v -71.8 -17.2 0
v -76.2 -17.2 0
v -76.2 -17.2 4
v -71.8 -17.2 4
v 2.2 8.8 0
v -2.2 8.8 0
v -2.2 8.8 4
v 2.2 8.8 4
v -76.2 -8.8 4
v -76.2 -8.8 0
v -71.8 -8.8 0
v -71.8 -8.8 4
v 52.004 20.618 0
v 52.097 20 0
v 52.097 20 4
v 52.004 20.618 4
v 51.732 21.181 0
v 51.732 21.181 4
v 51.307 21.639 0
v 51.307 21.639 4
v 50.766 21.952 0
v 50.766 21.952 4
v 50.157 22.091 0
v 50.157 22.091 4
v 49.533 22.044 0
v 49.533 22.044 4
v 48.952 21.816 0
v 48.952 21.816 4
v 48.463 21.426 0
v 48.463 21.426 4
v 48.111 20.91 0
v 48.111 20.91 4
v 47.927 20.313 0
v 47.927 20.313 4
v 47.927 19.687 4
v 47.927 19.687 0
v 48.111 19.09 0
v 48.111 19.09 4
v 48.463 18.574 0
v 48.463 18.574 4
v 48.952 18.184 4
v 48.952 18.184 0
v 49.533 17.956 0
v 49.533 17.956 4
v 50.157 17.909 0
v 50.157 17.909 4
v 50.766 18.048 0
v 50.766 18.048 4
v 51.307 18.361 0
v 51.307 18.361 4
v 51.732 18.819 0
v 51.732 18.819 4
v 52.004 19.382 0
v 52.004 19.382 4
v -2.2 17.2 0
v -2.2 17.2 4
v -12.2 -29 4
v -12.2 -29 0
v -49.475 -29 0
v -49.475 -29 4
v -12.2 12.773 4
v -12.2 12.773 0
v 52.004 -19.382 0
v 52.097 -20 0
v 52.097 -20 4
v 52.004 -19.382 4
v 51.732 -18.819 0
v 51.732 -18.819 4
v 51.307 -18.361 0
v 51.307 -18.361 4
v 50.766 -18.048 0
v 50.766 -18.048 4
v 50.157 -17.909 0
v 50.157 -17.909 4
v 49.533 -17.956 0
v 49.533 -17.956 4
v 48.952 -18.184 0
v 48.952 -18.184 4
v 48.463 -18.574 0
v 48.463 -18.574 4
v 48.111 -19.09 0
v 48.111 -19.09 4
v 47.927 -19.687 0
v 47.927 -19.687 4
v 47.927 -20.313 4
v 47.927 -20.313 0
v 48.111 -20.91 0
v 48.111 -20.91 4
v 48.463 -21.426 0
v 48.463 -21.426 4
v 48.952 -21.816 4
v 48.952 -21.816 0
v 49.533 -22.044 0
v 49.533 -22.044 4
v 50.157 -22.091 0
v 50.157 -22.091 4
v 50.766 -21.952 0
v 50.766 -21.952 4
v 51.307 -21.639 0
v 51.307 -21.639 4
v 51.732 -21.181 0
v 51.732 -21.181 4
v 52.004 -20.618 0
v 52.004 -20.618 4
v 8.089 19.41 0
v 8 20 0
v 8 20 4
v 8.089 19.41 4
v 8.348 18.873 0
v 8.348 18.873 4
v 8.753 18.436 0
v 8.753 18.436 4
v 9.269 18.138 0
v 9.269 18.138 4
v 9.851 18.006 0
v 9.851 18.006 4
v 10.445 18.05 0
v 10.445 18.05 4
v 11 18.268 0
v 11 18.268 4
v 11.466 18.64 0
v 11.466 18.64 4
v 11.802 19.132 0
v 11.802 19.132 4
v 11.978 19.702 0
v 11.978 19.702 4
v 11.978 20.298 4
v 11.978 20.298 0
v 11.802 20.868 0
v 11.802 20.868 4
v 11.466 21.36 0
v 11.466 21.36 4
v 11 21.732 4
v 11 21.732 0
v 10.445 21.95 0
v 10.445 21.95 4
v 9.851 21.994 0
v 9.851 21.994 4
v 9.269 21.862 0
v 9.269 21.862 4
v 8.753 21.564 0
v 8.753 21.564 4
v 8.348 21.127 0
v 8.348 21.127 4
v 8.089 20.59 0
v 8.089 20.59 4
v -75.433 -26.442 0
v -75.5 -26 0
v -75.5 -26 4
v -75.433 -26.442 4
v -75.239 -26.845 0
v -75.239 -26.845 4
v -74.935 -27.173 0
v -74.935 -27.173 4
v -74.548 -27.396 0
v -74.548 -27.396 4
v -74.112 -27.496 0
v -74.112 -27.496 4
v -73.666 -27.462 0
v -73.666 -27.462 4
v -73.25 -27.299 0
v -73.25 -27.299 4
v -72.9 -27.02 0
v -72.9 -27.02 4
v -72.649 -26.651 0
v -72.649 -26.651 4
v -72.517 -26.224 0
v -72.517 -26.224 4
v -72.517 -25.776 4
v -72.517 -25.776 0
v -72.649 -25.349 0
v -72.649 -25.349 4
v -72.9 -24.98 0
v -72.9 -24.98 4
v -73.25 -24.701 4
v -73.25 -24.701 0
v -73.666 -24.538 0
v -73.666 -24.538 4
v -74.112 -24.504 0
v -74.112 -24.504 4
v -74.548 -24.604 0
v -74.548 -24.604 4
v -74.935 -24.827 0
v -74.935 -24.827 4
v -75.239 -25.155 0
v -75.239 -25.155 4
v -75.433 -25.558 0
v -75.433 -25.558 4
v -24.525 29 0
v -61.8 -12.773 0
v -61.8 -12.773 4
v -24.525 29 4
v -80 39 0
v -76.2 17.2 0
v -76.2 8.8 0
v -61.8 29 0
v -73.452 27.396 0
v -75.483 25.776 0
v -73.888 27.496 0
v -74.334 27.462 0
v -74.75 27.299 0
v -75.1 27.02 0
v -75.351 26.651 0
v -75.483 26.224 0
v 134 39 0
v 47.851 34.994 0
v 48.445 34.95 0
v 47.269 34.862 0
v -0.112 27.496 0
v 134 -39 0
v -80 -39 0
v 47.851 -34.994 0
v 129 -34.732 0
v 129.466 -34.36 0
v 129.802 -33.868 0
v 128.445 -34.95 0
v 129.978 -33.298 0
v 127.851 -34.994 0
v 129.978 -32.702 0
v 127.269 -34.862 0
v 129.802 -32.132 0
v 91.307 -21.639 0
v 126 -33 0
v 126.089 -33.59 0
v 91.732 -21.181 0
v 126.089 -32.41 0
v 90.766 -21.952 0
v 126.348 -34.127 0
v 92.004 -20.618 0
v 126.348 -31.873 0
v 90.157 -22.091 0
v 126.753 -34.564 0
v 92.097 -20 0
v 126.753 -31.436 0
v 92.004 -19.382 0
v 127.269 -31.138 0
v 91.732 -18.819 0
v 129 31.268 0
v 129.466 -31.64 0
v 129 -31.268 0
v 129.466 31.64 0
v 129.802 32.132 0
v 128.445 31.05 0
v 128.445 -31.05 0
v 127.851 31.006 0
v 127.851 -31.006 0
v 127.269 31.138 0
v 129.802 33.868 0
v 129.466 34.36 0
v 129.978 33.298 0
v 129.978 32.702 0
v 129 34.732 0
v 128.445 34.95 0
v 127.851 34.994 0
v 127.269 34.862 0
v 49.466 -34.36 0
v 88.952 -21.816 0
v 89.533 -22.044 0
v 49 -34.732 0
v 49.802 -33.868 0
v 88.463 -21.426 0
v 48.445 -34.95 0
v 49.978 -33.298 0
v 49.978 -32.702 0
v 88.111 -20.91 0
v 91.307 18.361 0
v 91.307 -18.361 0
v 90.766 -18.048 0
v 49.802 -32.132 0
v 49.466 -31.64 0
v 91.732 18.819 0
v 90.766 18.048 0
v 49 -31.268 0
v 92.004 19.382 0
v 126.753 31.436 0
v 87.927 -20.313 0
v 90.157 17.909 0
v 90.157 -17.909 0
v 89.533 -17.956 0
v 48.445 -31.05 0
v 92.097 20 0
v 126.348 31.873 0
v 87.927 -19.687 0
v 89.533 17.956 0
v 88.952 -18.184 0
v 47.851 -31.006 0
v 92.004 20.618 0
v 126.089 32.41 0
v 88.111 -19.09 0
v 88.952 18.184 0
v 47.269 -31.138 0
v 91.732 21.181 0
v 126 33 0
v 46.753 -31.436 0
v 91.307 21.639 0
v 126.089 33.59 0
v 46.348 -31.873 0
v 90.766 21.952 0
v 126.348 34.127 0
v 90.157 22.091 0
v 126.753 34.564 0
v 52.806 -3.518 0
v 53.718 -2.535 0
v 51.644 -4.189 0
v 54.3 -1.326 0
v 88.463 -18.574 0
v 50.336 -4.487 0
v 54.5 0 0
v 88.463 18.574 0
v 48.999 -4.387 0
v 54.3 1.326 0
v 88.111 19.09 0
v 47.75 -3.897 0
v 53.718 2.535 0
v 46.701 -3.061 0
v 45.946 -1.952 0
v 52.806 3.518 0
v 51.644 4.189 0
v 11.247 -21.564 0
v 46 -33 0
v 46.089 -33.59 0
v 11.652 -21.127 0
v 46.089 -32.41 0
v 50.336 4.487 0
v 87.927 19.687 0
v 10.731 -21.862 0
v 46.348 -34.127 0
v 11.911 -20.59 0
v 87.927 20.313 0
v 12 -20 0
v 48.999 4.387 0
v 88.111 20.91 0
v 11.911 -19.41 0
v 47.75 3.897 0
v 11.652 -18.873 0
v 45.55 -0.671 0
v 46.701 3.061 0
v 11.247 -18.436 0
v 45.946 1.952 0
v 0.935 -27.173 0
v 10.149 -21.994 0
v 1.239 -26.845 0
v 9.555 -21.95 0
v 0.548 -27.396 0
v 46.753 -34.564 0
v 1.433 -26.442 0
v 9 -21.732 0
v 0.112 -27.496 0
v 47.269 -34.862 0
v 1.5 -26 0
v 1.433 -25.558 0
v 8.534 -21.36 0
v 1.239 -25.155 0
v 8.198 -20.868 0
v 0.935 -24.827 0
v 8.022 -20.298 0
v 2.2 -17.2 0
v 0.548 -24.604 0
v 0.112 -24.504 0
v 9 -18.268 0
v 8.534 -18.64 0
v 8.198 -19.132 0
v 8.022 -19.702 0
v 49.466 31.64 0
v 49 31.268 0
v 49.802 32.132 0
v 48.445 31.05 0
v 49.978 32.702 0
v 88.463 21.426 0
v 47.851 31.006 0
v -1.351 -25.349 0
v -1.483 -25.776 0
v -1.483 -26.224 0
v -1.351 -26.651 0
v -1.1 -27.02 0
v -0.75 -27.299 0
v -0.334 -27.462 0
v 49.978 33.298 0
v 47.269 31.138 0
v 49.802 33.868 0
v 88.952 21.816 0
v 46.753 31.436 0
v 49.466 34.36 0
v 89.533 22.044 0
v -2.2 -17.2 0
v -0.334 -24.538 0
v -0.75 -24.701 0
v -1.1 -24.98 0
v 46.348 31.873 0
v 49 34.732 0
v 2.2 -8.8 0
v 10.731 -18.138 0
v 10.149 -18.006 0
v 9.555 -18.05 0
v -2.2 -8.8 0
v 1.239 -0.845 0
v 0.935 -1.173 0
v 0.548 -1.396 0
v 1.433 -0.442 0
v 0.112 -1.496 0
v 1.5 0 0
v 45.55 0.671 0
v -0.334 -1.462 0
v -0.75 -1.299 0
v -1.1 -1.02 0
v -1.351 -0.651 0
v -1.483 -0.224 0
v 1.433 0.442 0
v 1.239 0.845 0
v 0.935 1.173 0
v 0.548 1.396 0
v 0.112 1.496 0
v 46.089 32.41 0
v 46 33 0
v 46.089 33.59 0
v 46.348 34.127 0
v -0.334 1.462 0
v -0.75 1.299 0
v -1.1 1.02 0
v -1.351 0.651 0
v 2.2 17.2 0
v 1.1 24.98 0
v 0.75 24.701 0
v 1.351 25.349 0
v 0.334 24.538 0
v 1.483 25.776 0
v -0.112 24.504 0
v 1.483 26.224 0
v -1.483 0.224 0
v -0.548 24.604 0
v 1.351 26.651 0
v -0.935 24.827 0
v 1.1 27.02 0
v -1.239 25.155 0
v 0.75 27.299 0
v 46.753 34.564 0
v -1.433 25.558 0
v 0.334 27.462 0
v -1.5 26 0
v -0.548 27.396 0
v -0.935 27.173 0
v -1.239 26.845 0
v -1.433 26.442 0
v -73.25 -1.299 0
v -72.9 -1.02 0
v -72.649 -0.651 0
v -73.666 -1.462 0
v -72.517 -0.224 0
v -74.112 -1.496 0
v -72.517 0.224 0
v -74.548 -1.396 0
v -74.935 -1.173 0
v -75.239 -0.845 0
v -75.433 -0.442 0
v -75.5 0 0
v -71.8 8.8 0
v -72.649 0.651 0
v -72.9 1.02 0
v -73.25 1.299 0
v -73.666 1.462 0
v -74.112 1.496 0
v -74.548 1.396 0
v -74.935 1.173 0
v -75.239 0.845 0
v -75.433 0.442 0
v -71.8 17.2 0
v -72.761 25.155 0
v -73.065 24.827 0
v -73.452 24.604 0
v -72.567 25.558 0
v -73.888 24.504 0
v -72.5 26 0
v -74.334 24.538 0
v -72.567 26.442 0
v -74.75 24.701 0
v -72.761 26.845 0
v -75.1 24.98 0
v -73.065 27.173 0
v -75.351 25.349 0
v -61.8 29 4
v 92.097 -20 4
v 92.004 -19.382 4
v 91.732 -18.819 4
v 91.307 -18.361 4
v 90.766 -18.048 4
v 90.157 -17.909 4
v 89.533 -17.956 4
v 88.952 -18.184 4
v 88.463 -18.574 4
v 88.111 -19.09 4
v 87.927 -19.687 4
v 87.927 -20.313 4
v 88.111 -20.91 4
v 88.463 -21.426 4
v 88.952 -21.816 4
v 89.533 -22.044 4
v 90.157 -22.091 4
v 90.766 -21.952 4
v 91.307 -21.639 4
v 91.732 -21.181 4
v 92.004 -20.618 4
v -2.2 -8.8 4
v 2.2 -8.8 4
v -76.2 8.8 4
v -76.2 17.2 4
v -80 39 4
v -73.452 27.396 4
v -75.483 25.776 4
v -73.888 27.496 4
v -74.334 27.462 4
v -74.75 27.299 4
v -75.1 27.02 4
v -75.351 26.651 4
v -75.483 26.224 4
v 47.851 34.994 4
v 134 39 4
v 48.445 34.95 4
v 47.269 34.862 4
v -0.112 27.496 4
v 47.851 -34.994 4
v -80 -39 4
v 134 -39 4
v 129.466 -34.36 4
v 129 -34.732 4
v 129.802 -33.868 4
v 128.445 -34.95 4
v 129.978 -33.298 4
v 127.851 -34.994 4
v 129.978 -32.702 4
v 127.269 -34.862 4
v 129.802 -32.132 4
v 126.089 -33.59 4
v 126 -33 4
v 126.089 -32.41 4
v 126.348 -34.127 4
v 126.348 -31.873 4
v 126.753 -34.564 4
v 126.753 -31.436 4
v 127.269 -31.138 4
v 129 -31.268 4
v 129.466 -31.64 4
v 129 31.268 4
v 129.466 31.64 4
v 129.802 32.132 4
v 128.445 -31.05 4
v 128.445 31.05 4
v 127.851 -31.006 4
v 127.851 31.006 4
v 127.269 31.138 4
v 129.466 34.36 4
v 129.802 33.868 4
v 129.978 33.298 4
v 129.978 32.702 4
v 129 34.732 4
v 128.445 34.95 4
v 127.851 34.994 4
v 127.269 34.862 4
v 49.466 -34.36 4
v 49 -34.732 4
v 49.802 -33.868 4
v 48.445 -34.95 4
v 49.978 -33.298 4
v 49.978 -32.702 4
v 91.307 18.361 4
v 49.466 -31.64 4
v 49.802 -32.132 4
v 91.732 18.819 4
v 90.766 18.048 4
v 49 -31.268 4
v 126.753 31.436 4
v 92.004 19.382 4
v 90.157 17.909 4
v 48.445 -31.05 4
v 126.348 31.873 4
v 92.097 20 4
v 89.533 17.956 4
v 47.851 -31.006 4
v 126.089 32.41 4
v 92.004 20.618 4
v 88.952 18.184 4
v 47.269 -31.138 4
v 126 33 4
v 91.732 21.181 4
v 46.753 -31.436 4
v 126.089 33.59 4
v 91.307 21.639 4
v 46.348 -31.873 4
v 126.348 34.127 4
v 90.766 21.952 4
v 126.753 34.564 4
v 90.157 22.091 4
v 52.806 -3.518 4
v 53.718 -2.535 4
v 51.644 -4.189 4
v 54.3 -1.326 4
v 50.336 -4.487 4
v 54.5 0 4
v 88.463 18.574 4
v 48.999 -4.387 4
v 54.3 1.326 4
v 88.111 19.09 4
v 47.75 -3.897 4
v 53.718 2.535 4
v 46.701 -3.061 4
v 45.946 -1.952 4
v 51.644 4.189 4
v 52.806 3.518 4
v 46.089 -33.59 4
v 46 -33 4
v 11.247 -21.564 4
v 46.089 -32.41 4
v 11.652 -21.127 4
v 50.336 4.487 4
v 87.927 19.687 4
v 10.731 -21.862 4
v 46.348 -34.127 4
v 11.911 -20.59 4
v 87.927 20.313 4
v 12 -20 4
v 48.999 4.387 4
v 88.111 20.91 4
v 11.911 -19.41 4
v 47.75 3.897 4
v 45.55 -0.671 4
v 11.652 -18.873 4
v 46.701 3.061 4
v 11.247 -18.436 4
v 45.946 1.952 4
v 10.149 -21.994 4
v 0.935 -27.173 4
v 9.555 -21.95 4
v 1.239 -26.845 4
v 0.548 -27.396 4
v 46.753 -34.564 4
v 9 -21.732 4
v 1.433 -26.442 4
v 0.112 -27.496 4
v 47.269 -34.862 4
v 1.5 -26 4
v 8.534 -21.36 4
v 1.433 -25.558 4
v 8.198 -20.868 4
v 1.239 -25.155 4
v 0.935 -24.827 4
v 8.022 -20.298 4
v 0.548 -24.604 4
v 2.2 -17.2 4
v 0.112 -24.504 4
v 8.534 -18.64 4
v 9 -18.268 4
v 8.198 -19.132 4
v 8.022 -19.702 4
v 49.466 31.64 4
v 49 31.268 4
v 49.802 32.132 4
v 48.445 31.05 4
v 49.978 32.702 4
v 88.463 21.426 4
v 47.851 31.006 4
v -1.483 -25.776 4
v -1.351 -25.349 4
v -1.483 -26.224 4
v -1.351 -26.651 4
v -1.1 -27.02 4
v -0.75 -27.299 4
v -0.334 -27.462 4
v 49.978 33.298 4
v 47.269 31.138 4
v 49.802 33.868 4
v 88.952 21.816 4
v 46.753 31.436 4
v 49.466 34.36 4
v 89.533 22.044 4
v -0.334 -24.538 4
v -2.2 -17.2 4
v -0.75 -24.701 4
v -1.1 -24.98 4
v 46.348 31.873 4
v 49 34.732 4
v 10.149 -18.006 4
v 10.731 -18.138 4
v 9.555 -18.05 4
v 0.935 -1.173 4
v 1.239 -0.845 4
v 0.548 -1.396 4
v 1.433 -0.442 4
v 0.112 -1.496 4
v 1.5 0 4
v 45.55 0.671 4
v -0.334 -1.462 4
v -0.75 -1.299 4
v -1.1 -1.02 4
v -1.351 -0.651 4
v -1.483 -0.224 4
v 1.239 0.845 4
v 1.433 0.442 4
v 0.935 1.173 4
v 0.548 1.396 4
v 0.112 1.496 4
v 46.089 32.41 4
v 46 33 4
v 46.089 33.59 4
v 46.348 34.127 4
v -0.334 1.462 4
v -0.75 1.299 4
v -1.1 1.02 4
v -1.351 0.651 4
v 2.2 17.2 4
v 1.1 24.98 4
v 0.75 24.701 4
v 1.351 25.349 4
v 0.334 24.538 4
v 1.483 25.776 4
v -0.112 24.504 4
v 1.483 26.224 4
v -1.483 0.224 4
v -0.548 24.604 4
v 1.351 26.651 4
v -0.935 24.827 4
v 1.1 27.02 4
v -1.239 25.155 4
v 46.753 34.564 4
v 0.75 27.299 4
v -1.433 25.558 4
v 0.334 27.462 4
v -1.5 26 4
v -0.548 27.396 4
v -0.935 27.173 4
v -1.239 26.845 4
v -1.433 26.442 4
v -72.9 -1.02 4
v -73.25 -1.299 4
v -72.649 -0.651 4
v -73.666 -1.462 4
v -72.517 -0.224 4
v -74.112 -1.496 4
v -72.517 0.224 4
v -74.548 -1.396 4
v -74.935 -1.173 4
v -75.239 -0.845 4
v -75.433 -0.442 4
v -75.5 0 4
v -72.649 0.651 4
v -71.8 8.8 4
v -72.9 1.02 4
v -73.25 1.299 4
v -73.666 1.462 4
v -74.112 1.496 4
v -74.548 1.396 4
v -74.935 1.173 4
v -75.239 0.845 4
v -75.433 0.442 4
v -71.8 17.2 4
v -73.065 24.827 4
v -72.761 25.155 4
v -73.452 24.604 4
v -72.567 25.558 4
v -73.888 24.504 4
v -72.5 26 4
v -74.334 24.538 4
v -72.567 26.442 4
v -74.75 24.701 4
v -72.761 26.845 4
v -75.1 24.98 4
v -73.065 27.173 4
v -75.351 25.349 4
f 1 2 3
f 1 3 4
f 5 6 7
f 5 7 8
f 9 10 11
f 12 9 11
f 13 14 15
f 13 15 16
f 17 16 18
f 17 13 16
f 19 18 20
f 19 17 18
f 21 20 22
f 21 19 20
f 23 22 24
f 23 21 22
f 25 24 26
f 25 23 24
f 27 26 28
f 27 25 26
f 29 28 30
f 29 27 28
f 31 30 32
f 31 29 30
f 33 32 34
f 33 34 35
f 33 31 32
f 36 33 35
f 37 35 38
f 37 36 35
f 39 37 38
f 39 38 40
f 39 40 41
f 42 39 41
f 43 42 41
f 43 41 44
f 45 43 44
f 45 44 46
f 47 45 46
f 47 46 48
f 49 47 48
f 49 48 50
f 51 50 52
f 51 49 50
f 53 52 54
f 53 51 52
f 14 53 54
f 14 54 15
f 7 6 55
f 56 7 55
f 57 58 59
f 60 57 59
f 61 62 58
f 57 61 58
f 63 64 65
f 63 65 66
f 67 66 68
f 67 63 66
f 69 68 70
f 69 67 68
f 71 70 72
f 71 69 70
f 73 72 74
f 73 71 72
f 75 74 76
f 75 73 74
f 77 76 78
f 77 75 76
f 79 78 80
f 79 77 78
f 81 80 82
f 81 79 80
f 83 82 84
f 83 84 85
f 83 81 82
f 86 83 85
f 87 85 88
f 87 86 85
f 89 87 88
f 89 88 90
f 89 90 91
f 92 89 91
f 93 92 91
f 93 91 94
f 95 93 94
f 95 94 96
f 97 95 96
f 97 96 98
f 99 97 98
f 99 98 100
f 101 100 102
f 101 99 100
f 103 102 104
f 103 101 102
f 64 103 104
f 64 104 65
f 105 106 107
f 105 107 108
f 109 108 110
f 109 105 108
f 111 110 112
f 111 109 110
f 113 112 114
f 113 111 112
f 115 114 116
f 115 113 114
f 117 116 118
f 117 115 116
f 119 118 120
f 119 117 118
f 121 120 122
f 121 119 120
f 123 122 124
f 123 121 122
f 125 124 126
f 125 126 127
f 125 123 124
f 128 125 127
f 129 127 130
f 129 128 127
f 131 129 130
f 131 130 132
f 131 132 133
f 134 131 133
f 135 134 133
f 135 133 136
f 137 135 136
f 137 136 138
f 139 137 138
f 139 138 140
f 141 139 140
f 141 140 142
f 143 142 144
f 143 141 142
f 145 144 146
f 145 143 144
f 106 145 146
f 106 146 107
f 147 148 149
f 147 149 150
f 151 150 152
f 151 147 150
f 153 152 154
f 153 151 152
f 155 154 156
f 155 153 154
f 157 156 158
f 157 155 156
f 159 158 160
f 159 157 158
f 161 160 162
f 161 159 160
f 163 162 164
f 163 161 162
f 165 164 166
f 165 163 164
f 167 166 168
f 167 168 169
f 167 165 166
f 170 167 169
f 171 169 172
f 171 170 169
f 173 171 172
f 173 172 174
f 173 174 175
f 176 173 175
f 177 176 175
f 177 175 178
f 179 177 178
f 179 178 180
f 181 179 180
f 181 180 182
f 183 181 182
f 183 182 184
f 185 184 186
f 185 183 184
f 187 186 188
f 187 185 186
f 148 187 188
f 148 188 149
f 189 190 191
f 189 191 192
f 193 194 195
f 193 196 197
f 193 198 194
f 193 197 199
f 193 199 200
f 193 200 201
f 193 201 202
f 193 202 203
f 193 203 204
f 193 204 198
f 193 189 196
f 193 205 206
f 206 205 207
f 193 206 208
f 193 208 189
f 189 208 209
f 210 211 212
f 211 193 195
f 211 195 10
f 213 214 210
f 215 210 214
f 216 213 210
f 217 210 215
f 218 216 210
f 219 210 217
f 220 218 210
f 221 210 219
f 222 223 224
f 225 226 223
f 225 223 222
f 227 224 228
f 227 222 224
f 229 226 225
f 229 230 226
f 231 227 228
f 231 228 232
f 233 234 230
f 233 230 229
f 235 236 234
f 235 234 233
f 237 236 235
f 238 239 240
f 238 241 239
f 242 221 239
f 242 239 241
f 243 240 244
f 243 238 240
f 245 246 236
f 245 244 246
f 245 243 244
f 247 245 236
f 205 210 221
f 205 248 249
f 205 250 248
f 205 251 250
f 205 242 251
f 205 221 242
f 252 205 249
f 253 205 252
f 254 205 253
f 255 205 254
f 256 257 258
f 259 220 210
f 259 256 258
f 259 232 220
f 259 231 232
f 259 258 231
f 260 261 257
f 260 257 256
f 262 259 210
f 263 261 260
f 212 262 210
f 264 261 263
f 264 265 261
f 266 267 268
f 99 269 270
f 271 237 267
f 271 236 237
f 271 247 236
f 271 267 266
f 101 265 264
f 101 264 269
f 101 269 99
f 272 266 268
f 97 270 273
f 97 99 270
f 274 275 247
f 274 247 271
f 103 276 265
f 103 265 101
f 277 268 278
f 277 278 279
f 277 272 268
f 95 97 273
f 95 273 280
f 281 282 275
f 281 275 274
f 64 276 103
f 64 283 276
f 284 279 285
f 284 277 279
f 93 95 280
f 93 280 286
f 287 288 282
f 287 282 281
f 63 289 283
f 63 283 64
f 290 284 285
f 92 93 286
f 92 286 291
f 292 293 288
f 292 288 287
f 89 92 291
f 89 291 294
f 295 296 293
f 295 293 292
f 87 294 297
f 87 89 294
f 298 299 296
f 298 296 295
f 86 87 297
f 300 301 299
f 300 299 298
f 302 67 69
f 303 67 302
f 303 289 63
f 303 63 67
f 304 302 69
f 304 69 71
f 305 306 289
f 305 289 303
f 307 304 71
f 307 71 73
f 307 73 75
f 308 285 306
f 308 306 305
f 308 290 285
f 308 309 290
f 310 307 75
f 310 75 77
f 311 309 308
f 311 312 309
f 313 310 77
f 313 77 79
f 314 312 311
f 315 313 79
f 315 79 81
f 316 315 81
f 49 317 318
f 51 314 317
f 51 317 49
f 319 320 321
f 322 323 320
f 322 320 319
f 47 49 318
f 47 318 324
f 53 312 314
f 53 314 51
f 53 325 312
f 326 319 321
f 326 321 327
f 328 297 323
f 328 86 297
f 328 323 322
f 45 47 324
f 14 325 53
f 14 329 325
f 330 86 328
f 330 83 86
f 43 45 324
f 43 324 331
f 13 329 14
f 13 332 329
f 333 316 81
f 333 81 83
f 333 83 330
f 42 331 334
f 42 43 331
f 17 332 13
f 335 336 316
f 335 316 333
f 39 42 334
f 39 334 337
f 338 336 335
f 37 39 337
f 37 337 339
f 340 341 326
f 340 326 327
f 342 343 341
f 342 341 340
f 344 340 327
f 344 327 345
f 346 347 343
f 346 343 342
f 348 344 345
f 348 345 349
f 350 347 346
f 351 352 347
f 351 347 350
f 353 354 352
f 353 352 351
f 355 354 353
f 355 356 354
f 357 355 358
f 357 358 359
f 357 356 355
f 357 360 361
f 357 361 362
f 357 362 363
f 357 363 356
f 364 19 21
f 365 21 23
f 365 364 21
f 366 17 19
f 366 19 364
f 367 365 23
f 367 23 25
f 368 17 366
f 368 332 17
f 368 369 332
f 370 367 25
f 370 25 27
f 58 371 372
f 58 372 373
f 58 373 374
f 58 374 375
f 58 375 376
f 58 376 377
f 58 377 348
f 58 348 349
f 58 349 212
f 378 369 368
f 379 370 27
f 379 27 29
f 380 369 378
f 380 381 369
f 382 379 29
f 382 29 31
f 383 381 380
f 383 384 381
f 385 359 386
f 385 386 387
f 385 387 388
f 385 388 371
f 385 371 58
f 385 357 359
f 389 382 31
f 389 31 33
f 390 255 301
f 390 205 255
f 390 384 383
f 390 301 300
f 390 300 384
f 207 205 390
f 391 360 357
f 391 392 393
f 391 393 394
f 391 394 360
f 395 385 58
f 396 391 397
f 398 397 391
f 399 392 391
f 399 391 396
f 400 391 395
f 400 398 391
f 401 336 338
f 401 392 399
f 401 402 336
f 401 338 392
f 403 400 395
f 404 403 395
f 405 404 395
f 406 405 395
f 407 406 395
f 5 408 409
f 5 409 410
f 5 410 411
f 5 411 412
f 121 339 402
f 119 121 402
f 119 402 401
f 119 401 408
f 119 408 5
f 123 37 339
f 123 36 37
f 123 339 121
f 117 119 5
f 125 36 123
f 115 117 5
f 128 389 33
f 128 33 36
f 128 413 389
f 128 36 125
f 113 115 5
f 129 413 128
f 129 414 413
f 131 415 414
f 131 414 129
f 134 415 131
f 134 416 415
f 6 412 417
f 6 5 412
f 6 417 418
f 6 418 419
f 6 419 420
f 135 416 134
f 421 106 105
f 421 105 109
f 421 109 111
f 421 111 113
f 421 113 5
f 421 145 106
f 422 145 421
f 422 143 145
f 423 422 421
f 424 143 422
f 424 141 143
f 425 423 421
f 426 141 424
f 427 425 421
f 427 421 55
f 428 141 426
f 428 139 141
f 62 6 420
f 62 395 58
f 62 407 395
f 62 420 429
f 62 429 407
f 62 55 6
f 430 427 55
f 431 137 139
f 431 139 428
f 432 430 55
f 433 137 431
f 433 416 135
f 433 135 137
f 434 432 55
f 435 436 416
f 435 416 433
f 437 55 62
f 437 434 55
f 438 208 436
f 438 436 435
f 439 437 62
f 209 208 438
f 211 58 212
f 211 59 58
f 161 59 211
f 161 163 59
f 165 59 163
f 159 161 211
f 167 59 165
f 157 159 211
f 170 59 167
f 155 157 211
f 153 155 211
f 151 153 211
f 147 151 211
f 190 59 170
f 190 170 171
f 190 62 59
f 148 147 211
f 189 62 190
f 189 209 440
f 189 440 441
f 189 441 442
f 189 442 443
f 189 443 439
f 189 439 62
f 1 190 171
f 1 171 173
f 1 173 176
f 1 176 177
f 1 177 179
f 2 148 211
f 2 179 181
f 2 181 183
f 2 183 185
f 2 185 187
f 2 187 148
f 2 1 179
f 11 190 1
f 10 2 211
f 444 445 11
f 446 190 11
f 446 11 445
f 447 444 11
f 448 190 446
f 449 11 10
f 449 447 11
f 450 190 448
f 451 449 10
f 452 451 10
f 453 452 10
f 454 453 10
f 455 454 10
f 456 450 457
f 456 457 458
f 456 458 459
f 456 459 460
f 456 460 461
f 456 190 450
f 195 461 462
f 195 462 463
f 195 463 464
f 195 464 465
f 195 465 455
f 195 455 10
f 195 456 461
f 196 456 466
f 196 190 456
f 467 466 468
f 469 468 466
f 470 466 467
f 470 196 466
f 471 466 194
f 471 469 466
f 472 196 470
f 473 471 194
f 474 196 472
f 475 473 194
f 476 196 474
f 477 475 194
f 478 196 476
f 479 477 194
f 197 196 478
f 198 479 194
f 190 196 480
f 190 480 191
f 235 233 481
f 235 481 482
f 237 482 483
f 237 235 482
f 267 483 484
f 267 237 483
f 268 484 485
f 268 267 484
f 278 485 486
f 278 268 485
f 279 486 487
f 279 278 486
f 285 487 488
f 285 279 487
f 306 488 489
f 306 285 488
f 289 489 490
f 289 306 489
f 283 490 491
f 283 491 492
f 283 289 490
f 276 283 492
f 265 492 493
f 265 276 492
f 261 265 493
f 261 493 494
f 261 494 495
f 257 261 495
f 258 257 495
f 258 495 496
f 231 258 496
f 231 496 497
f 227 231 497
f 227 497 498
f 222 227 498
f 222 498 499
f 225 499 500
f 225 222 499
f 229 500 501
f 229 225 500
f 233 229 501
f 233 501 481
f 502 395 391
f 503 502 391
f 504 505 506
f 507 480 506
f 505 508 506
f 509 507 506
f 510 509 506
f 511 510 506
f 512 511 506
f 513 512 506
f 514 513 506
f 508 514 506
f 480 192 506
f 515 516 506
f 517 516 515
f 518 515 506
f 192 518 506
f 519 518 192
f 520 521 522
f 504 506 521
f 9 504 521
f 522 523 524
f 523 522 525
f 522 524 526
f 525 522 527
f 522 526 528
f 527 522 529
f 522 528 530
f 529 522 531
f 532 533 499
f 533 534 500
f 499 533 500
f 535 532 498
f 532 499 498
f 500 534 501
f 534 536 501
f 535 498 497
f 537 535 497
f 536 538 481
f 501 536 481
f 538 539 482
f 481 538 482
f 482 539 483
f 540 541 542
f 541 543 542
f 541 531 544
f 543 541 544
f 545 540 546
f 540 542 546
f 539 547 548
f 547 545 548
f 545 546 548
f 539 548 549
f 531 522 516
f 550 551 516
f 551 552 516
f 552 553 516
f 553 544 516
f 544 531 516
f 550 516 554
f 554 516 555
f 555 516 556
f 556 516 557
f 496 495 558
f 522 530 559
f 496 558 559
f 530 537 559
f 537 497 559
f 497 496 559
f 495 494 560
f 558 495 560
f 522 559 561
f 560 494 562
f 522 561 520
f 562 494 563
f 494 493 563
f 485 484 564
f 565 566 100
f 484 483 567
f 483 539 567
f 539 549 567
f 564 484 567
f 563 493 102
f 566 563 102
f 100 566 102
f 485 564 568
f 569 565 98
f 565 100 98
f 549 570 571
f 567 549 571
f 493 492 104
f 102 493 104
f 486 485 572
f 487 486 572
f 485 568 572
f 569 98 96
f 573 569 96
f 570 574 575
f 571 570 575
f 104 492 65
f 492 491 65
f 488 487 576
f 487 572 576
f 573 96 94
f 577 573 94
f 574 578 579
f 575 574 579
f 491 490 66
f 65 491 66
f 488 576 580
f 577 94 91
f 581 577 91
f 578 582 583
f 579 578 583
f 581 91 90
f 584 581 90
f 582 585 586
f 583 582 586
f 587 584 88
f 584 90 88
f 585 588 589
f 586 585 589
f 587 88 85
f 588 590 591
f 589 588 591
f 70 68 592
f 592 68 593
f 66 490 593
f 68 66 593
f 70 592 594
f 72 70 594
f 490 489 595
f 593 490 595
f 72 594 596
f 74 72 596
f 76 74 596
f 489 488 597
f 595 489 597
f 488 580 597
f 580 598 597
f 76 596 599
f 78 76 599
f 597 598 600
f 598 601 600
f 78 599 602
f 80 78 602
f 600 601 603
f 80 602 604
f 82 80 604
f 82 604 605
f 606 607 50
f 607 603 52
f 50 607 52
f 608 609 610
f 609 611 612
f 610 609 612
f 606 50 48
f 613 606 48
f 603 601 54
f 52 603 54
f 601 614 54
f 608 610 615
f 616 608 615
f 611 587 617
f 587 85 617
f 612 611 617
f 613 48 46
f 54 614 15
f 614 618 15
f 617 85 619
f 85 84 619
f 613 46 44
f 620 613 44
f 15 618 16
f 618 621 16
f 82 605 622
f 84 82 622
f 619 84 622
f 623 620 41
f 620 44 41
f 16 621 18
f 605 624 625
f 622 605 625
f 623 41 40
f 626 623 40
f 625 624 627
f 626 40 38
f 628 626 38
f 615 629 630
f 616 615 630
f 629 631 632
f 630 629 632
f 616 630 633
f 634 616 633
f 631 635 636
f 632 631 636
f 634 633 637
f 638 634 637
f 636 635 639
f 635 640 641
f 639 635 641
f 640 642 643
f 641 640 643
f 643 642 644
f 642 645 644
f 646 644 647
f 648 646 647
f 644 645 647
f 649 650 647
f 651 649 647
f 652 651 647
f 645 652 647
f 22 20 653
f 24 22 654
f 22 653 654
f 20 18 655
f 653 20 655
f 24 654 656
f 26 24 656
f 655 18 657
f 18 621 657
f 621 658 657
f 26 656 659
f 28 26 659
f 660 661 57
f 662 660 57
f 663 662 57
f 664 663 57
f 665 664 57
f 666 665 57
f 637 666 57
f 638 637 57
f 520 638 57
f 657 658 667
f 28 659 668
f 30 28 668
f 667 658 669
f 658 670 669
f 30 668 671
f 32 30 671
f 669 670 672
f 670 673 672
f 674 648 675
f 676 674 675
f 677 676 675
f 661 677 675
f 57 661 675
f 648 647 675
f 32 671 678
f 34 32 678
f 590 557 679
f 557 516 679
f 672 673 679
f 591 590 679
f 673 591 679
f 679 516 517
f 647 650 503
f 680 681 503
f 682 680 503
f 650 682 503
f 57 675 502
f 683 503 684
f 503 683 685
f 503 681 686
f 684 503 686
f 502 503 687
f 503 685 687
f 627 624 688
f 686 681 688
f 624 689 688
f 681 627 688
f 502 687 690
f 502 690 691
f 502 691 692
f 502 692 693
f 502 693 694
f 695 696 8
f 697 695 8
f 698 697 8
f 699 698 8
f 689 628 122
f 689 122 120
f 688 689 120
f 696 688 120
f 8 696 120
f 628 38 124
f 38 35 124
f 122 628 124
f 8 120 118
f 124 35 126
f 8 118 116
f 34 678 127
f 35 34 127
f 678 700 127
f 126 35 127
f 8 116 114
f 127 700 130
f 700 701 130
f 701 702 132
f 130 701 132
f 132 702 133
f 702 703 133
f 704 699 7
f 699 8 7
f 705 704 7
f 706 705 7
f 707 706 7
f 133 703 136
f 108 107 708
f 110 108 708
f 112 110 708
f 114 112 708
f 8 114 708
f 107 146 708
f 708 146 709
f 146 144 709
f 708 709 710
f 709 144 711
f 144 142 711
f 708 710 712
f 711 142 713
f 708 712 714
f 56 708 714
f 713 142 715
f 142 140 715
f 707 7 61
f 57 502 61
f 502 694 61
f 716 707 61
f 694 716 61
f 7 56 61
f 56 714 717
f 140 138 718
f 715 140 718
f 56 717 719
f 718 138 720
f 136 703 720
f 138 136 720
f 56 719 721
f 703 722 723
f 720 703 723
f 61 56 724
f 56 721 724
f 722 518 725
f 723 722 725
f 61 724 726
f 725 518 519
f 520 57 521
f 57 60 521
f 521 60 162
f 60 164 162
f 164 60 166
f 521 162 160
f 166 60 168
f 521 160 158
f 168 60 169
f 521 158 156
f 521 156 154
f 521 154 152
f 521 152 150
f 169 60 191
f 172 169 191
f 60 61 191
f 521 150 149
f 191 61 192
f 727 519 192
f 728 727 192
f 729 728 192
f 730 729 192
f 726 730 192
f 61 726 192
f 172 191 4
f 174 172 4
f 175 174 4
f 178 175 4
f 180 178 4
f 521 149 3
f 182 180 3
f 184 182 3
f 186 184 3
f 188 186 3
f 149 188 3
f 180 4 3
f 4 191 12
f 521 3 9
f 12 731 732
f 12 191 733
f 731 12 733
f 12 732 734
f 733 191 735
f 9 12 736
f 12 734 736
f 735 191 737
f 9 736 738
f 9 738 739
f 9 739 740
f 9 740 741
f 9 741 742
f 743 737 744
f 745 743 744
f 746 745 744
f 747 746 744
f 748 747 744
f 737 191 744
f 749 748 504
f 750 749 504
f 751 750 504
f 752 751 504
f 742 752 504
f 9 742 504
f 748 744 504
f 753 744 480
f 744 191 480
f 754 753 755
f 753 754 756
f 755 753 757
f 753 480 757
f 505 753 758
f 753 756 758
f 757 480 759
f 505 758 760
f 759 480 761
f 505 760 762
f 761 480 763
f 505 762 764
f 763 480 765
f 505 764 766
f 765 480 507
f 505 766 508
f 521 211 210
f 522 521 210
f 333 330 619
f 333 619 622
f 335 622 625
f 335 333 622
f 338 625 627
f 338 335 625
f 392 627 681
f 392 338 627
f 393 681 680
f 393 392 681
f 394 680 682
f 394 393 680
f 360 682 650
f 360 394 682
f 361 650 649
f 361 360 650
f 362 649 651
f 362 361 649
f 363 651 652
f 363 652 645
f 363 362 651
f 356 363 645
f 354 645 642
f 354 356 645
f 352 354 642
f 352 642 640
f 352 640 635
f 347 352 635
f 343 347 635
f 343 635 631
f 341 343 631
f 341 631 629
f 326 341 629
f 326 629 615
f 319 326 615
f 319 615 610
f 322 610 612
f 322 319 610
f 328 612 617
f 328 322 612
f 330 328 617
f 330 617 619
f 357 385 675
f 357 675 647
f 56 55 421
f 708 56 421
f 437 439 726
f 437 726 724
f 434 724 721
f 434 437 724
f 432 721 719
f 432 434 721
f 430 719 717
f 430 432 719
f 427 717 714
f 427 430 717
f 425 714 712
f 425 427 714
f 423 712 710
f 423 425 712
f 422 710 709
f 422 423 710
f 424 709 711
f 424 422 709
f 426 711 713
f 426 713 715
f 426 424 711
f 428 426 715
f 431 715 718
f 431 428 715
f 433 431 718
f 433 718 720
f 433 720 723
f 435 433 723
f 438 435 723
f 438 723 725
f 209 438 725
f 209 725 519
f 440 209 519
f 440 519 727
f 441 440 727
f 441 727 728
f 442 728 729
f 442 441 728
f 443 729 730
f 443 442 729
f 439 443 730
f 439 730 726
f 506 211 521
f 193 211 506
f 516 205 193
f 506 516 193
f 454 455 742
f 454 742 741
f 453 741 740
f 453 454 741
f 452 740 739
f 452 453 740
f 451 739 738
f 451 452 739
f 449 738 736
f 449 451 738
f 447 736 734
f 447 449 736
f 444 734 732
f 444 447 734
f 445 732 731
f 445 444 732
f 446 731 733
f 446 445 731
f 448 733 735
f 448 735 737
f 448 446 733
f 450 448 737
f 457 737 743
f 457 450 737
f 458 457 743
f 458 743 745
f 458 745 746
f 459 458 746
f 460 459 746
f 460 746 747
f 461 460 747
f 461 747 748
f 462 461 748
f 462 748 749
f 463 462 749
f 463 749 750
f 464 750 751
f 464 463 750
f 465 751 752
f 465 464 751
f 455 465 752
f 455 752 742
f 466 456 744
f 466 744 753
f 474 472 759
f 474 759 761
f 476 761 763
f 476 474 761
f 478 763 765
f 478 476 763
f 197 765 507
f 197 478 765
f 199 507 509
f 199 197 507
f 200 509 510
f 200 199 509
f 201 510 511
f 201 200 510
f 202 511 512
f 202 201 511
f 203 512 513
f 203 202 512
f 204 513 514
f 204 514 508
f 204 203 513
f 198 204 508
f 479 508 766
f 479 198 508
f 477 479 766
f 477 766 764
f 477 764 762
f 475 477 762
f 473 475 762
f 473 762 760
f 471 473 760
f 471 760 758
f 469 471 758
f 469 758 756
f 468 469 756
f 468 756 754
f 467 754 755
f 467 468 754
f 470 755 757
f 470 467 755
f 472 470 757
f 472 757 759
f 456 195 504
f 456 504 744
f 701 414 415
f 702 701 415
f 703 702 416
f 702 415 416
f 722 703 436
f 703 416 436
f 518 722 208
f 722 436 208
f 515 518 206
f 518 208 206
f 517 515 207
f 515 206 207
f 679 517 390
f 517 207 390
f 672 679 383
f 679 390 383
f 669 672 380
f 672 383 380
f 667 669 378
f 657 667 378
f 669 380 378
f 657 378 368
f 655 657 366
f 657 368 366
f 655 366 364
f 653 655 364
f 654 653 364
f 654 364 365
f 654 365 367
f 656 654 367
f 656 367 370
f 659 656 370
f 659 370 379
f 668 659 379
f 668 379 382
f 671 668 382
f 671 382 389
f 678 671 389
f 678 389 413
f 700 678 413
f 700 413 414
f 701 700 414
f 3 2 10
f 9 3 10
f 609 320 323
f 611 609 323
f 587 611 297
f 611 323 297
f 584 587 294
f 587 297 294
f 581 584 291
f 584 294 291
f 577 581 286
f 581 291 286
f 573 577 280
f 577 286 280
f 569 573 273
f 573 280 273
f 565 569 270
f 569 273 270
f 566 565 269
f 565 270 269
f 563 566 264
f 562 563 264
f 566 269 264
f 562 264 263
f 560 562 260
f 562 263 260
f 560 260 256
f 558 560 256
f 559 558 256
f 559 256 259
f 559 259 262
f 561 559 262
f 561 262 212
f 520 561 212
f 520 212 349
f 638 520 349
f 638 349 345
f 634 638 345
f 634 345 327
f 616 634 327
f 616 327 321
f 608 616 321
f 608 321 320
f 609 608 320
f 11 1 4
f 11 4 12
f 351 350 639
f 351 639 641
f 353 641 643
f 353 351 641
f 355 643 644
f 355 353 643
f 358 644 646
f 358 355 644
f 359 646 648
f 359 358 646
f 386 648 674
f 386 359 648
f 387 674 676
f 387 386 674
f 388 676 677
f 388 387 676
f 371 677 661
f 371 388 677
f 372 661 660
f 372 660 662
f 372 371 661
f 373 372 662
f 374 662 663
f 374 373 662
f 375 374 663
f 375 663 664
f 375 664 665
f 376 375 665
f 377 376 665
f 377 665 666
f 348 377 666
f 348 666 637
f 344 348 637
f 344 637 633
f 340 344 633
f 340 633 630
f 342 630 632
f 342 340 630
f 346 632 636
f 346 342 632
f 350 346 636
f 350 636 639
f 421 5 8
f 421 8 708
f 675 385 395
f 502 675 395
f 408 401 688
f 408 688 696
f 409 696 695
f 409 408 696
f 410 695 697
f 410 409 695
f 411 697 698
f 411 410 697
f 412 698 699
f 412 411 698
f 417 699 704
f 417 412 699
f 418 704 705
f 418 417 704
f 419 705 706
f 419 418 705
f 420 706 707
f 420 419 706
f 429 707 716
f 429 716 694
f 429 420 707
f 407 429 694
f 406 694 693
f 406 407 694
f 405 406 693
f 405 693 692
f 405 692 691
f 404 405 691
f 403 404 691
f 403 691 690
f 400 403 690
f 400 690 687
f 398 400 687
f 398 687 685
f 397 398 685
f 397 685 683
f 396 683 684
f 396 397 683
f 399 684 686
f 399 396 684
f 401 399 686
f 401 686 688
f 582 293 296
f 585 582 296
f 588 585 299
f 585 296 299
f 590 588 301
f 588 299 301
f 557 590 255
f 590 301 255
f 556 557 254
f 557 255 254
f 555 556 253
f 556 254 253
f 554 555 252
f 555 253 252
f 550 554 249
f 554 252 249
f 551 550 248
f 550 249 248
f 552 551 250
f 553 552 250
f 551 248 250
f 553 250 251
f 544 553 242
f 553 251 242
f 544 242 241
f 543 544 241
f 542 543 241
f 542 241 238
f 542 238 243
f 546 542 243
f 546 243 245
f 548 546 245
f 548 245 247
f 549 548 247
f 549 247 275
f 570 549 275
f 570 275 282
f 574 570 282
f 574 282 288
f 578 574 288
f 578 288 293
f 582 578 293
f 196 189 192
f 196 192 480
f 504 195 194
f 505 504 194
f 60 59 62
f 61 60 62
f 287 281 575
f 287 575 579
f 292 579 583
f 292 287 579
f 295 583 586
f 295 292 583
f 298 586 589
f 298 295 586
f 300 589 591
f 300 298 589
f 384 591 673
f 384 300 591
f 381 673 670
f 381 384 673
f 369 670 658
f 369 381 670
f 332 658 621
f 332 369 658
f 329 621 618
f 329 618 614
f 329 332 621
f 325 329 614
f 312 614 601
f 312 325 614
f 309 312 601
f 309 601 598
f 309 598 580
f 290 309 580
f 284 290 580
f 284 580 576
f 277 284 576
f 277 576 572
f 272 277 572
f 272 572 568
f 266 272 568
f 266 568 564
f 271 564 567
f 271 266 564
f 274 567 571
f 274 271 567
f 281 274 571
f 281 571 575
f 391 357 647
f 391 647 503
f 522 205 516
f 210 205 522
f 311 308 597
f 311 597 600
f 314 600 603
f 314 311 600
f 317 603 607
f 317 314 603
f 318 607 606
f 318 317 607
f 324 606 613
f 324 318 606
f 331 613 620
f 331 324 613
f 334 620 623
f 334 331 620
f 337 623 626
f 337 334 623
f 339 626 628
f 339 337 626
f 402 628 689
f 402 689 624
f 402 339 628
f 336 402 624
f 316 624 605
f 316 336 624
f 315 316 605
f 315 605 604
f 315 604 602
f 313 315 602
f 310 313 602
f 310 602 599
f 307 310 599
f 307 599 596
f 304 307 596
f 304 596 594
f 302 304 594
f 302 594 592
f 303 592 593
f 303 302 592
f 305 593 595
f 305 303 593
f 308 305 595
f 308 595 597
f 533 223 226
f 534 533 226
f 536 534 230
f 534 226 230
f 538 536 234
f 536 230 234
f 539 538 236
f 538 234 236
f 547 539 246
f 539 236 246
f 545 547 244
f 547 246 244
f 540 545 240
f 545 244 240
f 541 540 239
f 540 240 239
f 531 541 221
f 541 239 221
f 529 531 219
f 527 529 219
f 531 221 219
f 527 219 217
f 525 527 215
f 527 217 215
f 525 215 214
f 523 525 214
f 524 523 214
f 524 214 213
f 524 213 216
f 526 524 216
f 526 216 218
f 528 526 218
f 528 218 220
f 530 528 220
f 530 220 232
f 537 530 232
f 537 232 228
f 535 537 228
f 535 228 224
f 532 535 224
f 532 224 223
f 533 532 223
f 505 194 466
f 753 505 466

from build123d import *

# Parameters (mm, degrees)
SKETCH_1_R          = 1.5
SKETCH_1_R_2        = 4.5
SKETCH_1_R_3        = 2.096788488
SKETCH_1_R_4        = 2
SKETCH_1_W          = 4.4
SKETCH_1_H          = 8.4
EXTRUDE_1_DEPTH     = 4
SKETCH_2_R          = 2
CUT_EXTRUDE_1_DEPTH = 10


with BuildPart() as part:
    # 草图1 → 凸台-拉伸1 (new body)
    with BuildSketch(Plane.XY):
        Polygon((-6, 39), (134, 39), (134, -39), (-6, -39), (-80, -39), (-80, 39), align=None)
        Circle(SKETCH_1_R, mode=Mode.SUBTRACT)
        with Locations(Location((0, 26, 0), (0, 0, 180))):
            Circle(SKETCH_1_R, mode=Mode.SUBTRACT)
        with Locations((0, -26)):
            Circle(SKETCH_1_R, mode=Mode.SUBTRACT)
        with Locations((50, 0)):
            Circle(SKETCH_1_R_2, mode=Mode.SUBTRACT)
        with Locations((50, 20)):
            Circle(SKETCH_1_R_3, mode=Mode.SUBTRACT)
        with Locations((50, -20)):
            Circle(SKETCH_1_R_3, mode=Mode.SUBTRACT)
        with Locations((90, -20)):
            Circle(SKETCH_1_R_3, mode=Mode.SUBTRACT)
        with Locations((90, 20)):
            Circle(SKETCH_1_R_3, mode=Mode.SUBTRACT)
        with Locations((10, -20)):
            Circle(SKETCH_1_R_4, mode=Mode.SUBTRACT)
        with Locations(Location((10, 20, 0), (0, 0, 180))):
            Circle(SKETCH_1_R_4, mode=Mode.SUBTRACT)
        with Locations(Location((-74, 0, 0), (0, 0, 180))):
            Circle(SKETCH_1_R, mode=Mode.SUBTRACT)
        with Locations((-74, 26)):
            Circle(SKETCH_1_R, mode=Mode.SUBTRACT)
        with Locations(Location((-74, -26, 0), (0, 0, 180))):
            Circle(SKETCH_1_R, mode=Mode.SUBTRACT)
        with Locations((0, 13)):
            Rectangle(SKETCH_1_W, SKETCH_1_H, mode=Mode.SUBTRACT)
        with Locations((0, -13)):
            Rectangle(SKETCH_1_W, SKETCH_1_H, mode=Mode.SUBTRACT)
        with Locations((-74, 13)):
            Rectangle(SKETCH_1_W, SKETCH_1_H, mode=Mode.SUBTRACT)
        with Locations((-74, -13)):
            Rectangle(SKETCH_1_W, SKETCH_1_H, mode=Mode.SUBTRACT)
    extrude(amount=EXTRUDE_1_DEPTH)

    # 草图2 → 切除-拉伸1 (cut)
    with BuildSketch(Plane(origin=(0, 0, 0), x_dir=(-1, 0, 0), z_dir=(0, 0, -1))):
        with Locations((-128, -33)):
            Circle(SKETCH_2_R)
        with Locations((-48, -33)):
            Circle(SKETCH_2_R)
        with Locations((-48, 33)):
            Circle(SKETCH_2_R)
        with Locations((-128, 33)):
            Circle(SKETCH_2_R)
        Polygon((61.8, -12.773298845), (24.525364108, 29), (61.8, 29), align=None)
        Polygon((12.2, -29), (49.474635892, -29), (12.2, 12.773298845), align=None)
    extrude(amount=-CUT_EXTRUDE_1_DEPTH, mode=Mode.SUBTRACT)


solid = part.part
